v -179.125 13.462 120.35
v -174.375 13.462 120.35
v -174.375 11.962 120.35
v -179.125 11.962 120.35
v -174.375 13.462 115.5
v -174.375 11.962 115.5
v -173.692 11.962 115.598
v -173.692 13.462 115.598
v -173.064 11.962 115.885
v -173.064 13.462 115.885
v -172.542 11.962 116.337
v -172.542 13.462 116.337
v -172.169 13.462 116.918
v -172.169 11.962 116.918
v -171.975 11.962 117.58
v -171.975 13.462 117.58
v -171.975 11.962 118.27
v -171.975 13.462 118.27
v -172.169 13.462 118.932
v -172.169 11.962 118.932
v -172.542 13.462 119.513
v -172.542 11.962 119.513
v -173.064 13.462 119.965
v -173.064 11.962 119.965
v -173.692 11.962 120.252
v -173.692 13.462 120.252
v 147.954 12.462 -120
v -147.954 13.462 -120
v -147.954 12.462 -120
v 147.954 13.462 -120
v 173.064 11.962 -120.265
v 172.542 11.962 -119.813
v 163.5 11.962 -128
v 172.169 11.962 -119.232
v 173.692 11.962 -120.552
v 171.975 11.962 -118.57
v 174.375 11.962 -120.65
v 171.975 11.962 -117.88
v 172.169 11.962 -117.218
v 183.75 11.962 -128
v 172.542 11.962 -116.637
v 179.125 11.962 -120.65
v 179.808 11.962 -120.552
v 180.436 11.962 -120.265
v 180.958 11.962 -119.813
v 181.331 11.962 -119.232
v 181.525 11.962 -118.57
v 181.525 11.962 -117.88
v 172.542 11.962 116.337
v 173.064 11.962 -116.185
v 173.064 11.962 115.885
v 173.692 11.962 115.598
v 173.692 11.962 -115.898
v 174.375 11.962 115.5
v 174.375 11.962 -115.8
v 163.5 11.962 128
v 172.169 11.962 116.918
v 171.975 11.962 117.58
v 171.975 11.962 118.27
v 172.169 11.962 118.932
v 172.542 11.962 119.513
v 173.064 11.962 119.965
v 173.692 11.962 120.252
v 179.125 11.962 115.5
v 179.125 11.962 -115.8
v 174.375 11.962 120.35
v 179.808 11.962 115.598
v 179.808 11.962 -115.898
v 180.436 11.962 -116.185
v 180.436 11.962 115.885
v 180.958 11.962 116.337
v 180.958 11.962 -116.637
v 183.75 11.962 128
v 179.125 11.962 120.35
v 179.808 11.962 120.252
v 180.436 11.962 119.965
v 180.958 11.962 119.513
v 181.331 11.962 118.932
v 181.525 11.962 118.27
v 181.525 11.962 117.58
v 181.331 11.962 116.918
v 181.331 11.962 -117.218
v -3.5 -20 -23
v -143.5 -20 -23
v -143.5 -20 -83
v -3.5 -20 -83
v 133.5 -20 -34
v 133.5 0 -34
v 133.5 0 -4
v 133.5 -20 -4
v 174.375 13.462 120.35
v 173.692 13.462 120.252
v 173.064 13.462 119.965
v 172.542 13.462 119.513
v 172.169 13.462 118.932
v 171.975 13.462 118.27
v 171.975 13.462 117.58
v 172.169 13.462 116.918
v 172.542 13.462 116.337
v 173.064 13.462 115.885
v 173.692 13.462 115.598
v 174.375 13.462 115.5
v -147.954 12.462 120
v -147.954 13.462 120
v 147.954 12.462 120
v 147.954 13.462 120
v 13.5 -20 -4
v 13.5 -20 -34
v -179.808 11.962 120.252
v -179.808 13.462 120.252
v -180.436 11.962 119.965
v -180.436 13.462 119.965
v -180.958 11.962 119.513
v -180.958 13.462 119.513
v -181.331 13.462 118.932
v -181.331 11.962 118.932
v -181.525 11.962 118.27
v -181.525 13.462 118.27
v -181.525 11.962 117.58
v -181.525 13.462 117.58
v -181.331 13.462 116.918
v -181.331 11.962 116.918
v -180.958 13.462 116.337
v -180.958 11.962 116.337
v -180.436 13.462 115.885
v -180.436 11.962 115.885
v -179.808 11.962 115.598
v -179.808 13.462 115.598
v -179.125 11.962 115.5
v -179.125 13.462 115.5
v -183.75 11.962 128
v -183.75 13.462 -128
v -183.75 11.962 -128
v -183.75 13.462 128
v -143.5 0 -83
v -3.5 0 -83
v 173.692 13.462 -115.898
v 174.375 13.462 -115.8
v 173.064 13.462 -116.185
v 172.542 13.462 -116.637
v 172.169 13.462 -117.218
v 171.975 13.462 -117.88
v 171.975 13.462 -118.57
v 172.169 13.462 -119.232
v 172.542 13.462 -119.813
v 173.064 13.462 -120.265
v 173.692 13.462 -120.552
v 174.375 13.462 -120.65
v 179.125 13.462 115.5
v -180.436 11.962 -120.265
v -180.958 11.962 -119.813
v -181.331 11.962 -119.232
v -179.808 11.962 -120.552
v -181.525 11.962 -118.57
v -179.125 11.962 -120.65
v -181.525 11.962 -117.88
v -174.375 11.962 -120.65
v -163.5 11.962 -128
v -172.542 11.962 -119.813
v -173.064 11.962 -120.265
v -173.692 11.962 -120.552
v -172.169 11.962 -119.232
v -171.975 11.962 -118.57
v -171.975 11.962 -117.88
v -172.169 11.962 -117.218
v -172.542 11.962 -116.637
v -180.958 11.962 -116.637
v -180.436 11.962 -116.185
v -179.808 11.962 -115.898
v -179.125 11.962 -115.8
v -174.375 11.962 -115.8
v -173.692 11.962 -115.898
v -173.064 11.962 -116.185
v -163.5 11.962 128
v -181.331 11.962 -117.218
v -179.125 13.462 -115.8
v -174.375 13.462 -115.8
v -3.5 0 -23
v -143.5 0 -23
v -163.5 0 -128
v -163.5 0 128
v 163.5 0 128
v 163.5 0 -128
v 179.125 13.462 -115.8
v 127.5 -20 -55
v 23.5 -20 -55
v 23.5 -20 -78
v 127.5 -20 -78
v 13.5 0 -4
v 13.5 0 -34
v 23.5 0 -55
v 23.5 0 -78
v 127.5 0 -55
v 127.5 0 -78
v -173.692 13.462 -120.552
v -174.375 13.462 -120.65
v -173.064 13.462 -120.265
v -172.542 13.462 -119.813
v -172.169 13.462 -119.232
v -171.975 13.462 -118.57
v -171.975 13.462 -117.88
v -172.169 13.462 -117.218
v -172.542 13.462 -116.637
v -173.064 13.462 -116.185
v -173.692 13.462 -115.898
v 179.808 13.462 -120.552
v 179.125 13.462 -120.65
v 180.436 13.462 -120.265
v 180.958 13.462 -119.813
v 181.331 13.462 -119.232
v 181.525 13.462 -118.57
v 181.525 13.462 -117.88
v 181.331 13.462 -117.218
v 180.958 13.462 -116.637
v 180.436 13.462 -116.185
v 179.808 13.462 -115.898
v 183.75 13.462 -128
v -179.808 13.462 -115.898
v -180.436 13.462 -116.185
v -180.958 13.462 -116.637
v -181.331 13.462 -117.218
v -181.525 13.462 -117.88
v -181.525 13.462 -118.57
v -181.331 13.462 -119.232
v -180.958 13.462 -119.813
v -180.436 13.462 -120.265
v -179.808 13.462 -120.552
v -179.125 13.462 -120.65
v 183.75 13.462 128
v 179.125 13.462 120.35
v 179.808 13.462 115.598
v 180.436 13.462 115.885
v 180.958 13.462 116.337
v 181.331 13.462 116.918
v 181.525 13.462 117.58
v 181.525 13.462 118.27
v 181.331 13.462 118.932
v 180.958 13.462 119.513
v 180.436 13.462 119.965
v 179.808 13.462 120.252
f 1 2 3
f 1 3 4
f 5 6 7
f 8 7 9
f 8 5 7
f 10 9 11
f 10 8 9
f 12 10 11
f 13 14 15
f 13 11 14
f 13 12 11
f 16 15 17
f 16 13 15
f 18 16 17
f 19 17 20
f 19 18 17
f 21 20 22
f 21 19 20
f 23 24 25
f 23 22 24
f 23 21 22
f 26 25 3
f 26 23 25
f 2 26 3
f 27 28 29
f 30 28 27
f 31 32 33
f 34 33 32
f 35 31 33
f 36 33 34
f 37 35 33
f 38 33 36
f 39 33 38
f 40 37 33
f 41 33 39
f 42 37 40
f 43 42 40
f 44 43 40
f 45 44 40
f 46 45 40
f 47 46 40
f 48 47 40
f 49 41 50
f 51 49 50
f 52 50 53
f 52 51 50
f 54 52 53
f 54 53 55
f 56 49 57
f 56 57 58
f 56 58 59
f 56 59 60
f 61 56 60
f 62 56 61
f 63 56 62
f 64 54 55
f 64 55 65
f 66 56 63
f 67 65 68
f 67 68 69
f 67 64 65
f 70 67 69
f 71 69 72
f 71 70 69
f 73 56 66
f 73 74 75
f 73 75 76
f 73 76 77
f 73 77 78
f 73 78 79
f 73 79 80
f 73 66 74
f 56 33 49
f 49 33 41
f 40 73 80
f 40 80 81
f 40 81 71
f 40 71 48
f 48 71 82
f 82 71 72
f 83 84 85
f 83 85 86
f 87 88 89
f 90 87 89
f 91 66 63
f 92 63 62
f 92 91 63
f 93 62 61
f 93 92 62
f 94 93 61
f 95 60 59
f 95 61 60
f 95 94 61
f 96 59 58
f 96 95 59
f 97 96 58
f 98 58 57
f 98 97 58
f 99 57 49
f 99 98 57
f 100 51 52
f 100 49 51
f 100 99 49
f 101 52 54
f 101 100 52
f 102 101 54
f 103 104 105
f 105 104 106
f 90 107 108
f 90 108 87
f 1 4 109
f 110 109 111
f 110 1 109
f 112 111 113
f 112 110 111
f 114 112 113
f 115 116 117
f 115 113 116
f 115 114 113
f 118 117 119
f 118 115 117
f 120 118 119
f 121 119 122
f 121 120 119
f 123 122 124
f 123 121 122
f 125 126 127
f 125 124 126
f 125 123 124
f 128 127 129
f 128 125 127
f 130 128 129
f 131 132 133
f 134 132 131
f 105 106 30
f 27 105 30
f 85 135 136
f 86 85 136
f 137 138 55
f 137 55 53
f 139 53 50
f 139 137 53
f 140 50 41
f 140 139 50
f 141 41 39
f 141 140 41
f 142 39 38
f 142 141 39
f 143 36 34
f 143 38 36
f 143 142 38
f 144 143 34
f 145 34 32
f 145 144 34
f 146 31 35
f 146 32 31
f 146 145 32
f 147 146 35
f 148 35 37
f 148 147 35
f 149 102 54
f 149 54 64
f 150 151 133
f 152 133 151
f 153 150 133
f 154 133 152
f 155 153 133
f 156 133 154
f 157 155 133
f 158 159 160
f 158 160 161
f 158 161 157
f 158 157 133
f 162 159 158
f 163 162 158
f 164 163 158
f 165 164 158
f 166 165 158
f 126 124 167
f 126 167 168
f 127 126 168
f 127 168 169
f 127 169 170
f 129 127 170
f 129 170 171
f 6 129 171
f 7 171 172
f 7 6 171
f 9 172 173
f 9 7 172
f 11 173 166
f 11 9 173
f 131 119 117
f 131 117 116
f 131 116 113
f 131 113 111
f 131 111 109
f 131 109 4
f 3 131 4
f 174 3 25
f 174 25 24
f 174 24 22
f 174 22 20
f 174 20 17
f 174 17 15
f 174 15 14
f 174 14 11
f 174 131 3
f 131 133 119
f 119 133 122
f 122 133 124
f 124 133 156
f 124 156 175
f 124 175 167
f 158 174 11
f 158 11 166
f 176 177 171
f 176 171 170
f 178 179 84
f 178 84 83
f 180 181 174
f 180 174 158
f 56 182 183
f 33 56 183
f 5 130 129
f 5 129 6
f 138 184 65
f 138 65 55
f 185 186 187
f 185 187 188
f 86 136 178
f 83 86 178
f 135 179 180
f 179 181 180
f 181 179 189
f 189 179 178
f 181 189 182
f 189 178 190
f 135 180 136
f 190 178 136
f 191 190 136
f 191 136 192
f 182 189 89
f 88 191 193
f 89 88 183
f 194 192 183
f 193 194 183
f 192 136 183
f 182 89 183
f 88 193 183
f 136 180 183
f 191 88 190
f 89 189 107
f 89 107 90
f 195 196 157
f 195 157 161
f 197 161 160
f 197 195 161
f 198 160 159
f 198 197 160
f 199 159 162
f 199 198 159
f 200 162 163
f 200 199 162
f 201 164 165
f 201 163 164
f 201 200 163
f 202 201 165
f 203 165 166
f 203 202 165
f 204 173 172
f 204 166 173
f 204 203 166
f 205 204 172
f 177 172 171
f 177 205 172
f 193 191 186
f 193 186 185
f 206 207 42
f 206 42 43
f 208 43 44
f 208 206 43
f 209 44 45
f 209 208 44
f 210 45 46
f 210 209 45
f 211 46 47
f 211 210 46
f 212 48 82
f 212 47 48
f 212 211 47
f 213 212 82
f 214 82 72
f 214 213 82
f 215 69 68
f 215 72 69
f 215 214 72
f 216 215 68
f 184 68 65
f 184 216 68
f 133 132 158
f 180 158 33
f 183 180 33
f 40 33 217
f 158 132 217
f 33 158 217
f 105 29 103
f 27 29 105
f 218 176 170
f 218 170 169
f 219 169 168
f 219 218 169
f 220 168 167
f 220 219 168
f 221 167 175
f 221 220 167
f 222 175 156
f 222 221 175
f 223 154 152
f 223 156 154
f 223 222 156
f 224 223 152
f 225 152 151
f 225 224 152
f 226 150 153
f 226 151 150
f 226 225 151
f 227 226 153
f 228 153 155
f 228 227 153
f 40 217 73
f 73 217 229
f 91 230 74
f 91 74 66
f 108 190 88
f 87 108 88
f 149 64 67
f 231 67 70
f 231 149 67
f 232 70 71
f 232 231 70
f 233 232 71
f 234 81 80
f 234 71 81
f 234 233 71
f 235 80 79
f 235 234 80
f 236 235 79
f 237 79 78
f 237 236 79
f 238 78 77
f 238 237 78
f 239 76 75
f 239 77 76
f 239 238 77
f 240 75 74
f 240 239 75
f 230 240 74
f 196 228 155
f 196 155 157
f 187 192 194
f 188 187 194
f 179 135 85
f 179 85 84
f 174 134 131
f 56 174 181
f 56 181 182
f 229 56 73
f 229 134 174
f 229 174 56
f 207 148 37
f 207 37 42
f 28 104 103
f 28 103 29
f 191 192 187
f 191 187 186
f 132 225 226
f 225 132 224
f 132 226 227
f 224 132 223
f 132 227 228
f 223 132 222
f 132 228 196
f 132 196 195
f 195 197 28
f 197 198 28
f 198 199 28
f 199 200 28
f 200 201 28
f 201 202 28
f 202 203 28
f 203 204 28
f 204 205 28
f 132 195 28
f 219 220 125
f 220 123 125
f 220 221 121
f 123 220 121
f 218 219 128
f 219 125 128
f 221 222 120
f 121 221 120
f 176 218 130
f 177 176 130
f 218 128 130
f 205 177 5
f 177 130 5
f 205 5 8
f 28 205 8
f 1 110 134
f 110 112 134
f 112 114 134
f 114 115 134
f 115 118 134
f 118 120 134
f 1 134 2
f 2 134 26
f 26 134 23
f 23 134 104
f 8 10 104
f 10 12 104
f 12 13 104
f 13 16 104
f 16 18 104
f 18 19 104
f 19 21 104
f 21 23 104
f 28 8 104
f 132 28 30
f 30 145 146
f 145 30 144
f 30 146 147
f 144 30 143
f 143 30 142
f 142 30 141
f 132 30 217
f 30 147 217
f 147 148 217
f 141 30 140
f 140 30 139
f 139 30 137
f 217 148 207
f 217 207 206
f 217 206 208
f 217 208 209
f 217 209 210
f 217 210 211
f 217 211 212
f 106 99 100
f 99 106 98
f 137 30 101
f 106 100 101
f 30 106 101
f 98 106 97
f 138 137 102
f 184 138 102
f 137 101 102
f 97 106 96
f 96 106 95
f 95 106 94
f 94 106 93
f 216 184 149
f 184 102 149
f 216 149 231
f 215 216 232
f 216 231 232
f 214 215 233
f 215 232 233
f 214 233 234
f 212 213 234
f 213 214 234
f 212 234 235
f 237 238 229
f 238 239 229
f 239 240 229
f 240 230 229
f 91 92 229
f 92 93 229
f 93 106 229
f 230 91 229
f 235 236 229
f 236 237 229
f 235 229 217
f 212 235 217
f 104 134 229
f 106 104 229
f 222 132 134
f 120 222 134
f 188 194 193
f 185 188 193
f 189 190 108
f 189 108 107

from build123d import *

# Parameters (mm, degrees)
SKETCH1_W           = 327
SKETCH1_H           = 256
BOSS_EXTRUDE1_DEPTH = 13.462
SKETCH2_W           = 20.25
SKETCH2_H           = 256
BOSS_EXTRUDE2_DEPTH = 1.5
SKETCH3_W           = 295.90708001
SKETCH3_H           = 240
CUT_EXTRUDE1_DEPTH  = 1
SKETCH4_W           = 140
SKETCH4_H           = 60
SKETCH4_W_2         = 120
SKETCH4_H_2         = 30
SKETCH4_W_3         = 104
SKETCH4_H_3         = 23
BOSS_EXTRUDE4_DEPTH = 20
CUT_EXTRUDE2_DEPTH  = 227.423867876


with BuildPart() as part:
    # Sketch1 → Boss-Extrude1 (new body)
    with BuildSketch(Plane(origin=(0, 0, 0), x_dir=(1, 0, 0), z_dir=(0, 1, 0))):
        Rectangle(SKETCH1_W, SKETCH1_H)
    extrude(amount=BOSS_EXTRUDE1_DEPTH)

    # Sketch2 → Boss-Extrude2 (add)
    with BuildSketch(Plane.XZ.offset(-13.462)):
        with Locations((173.625, 0)):
            Rectangle(SKETCH2_W, SKETCH2_H)
        with Locations((-173.625, 0)):
            Rectangle(SKETCH2_W, SKETCH2_H)
    extrude(amount=BOSS_EXTRUDE2_DEPTH)

    # Sketch3 → Cut-Extrude1 (cut)
    with BuildSketch(Plane(origin=(0, 13.462, 0), x_dir=(1, 0, 0), z_dir=(0, 1, 0))):
        Rectangle(SKETCH3_W, SKETCH3_H)
    extrude(amount=-CUT_EXTRUDE1_DEPTH, mode=Mode.SUBTRACT)

    # Sketch4 → Boss-Extrude4 (add)
    with BuildSketch(Plane.XZ):
        with Locations((-73.5, -53)):
            Rectangle(SKETCH4_W, SKETCH4_H)
        with Locations((73.5, -19)):
            Rectangle(SKETCH4_W_2, SKETCH4_H_2)
        with Locations((75.5, -66.5)):
            Rectangle(SKETCH4_W_3, SKETCH4_H_3)
    extrude(amount=BOSS_EXTRUDE4_DEPTH)

    # Sketch5 → Cut-Extrude2 (cut, through all)
    with BuildSketch(Plane(origin=(0, 13.462, 0), x_dir=(1, 0, 0), z_dir=(0, 1, 0))):
        with BuildLine():
            Line((174.375, 120.65), (179.125, 120.65))
            ThreePointArc((179.125, 120.65), (181.55, 118.225), (179.125, 115.8))
            Line((179.125, 115.8), (174.375, 115.8))
            ThreePointArc((174.375, 115.8), (171.95, 118.225), (174.375, 120.65))
        make_face()
        with BuildLine():
            Line((-179.125, 120.65), (-174.375, 120.65))
            ThreePointArc((-174.375, 120.65), (-171.95, 118.225), (-174.375, 115.8))
            Line((-174.375, 115.8), (-179.125, 115.8))
            ThreePointArc((-179.125, 115.8), (-181.55, 118.225), (-179.125, 120.65))
        make_face()
        with BuildLine():
            Line((-179.125, -115.5), (-174.375, -115.5))
            ThreePointArc((-174.375, -115.5), (-171.95, -117.925), (-174.375, -120.35))
            Line((-174.375, -120.35), (-179.125, -120.35))
            ThreePointArc((-179.125, -120.35), (-181.55, -117.925), (-179.125, -115.5))
        make_face()
        with BuildLine():
            Line((174.375, -115.5), (179.125, -115.5))
            ThreePointArc((179.125, -115.5), (181.55, -117.925), (179.125, -120.35))
            Line((179.125, -120.35), (174.375, -120.35))
            ThreePointArc((174.375, -120.35), (171.95, -117.925), (174.375, -115.5))
        make_face()
    extrude(amount=-CUT_EXTRUDE2_DEPTH, mode=Mode.SUBTRACT)


solid = part.part
